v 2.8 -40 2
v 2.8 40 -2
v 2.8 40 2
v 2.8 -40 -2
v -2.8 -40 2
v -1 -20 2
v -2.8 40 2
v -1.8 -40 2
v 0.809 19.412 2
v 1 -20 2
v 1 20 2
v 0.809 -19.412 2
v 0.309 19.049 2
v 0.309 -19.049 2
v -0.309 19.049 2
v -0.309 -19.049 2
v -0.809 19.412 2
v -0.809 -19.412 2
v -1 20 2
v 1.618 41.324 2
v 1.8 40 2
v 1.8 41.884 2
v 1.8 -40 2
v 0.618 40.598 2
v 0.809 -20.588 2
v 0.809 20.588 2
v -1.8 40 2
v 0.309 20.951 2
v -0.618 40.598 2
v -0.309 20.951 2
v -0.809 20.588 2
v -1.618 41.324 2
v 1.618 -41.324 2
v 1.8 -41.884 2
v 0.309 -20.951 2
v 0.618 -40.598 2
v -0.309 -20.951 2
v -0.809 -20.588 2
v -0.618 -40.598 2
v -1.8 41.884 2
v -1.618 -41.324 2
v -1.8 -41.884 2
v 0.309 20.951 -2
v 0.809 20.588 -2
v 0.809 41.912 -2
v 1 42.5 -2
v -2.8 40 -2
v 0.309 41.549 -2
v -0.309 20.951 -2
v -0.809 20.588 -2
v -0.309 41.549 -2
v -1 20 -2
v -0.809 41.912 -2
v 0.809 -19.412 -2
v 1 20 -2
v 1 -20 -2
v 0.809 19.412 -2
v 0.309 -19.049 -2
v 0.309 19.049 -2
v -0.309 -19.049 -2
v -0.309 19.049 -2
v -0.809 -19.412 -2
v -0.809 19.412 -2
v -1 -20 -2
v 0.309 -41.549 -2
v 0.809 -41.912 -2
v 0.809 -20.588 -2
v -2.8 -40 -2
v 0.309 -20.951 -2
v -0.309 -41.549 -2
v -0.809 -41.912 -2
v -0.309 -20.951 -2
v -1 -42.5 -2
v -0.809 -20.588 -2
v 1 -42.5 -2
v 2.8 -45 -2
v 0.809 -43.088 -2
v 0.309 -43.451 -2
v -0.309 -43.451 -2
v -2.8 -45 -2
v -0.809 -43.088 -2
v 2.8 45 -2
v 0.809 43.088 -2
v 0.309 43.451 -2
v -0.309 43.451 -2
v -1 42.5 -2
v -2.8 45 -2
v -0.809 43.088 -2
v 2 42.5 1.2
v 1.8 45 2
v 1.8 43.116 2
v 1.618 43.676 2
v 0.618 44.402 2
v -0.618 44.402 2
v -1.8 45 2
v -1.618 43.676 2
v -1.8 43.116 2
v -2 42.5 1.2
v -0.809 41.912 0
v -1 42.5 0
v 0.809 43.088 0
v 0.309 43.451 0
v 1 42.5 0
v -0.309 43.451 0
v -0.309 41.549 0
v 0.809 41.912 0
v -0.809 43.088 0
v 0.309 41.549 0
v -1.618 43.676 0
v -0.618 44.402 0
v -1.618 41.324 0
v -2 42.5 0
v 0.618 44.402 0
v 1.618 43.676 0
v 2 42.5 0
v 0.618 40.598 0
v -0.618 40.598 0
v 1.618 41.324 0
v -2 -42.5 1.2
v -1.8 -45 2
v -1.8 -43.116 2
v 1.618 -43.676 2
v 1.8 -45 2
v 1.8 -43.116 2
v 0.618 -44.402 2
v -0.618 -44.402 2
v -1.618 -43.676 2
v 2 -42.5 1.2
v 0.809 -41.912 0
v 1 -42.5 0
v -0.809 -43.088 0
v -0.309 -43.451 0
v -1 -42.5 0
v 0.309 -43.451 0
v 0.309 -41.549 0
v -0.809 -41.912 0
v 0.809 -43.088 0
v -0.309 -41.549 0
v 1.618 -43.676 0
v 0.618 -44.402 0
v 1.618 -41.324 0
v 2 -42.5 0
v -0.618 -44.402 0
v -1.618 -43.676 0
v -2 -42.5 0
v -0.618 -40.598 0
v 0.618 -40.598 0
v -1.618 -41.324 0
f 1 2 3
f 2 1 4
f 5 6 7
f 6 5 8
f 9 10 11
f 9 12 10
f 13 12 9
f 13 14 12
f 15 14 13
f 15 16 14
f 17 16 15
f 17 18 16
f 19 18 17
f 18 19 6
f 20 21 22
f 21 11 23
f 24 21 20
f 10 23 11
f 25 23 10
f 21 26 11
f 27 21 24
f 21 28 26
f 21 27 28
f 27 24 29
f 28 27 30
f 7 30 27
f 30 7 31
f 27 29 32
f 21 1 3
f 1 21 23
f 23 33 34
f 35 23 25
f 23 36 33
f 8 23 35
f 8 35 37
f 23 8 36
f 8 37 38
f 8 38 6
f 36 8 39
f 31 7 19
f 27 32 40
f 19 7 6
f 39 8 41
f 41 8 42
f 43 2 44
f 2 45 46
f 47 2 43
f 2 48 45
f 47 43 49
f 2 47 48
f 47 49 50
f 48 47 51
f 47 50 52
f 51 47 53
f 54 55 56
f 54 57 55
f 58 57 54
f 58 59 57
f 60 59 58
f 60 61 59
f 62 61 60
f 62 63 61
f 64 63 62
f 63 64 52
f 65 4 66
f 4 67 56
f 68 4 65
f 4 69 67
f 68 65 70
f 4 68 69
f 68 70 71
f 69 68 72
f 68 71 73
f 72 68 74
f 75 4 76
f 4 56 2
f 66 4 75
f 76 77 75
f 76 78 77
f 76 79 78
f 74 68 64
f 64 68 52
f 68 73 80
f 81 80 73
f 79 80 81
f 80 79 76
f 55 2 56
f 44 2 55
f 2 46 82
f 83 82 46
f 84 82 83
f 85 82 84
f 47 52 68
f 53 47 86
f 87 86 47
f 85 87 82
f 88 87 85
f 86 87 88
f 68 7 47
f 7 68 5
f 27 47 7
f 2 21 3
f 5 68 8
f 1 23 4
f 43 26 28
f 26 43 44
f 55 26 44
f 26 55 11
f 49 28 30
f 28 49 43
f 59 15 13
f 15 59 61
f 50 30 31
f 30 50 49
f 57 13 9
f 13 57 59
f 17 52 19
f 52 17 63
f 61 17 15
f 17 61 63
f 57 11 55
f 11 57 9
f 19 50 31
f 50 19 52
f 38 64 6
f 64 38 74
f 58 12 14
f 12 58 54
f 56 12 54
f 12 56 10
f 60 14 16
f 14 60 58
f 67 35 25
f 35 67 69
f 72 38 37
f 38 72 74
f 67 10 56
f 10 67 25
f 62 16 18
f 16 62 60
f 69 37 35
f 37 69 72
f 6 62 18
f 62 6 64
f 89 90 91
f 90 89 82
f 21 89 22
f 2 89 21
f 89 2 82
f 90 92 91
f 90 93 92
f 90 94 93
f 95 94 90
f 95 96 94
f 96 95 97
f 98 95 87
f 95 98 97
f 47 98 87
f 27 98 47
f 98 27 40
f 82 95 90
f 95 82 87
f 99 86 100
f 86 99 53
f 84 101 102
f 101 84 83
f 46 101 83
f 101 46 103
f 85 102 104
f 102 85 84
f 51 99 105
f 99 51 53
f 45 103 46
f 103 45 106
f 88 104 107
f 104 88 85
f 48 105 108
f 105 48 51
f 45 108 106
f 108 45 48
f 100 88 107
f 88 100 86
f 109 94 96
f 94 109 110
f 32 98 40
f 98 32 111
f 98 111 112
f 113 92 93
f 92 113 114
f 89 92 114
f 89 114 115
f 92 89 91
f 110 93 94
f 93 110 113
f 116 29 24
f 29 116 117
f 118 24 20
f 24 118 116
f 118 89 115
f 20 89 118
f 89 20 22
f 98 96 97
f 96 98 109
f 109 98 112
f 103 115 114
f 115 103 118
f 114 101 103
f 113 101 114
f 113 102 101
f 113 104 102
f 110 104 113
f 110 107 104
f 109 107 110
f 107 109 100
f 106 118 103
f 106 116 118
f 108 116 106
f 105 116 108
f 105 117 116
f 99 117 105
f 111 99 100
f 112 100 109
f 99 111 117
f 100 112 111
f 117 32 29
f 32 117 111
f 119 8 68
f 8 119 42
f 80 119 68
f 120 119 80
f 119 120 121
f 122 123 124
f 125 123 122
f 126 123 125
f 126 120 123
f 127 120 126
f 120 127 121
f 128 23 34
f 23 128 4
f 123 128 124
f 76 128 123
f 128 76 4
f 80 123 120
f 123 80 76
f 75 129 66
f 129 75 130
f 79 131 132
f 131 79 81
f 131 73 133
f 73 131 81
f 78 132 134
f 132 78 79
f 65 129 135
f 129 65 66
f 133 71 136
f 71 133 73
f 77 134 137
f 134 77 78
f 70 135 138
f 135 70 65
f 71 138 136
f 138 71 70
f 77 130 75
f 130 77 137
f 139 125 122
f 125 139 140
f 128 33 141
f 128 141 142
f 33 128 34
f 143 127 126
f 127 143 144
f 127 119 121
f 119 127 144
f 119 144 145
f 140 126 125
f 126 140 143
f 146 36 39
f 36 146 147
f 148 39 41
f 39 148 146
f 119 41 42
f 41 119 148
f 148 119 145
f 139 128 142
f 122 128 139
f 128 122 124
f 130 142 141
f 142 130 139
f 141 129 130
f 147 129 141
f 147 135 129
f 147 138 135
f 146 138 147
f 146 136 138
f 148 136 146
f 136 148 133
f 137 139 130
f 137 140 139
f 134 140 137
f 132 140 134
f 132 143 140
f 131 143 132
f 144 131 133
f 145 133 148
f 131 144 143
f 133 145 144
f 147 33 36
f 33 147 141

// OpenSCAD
// file: TrapezioIsoceles.scad
module TrapezioIsoceles(profundidade,largura,altura,deslocamento) {

//altura = 4;
//profundidade = 5; 
//largura = 6;
//deslocamento = 1; 
//altura=altura+0.2;
deslocamentoZ = -altura/2;
deslocamentoX = -largura/2; 
deslocamentoY = -profundidade/2;

pontosTrapezio = [
  [ deslocamentoX, deslocamentoY,  deslocamentoZ ],  //0
  [ deslocamentoX+largura, deslocamentoY,  deslocamentoZ ],  //1
  [ deslocamentoX+largura, deslocamentoY+profundidade,  deslocamentoZ ],  //2
  [ deslocamentoX+0, deslocamentoY+profundidade, deslocamentoZ ],  //3
  [ deslocamentoX+deslocamento,  deslocamentoY, deslocamentoZ+altura ],  //4
  [ deslocamentoX+largura-deslocamento,  deslocamentoY, deslocamentoZ+altura ],  //5
  [ deslocamentoX+largura-deslocamento,deslocamentoY+profundidade, deslocamentoZ+altura ],  //6
  [ deslocamentoX+deslocamento,  deslocamentoY+profundidade, deslocamentoZ+altura ]]; //7
  
facesTrapezio = [
  [0,1,2,3],  // bottom
  [4,5,1,0],  // front
  [7,6,5,4],  // top
  [5,6,2,1],  // right
  [6,7,3,2],  // back
  [7,4,0,3]]; // left
  
polyhedron( pontosTrapezio, facesTrapezio );


//polygon([[0,0],[5,0],[4,3],[1,3]]);

//cube([17,17,3]);
}
// file: TrapezioFurado.scad
use <TrapezioIsoceles.scad>


module TrapezioFurado(profundidade,largura,altura) {

    //altura = 4; 
    tamCubo = 24; 
    deslocamento = 1;

    //profundidade = 5; 
    //largura = 6; 
    posTrapezio = tamCubo/2 - altura/2;
    hFuros = profundidade;

    difference() {
        TrapezioIsoceles(profundidade,largura,altura,deslocamento); 

        cylinder (altura+0.1, r=1, center = true, $fn=10);
        translate([0,0,altura-2])
        cylinder (altura, r=2, center = true, $fn=10);
    }
}

//TrapezioFurado(5,5,4); 
// file: Haste.scad
use <TrapezioFurado.scad>
use <TrapezioIsoceles.scad>

module Haste(largura,altura,comprimento,suportes) {
 
profundidadeTrapezio = 5; 
larguraTrapezio = largura; 

if (suportes) {
// Suportes laterais 
for (a = [0:180:181]) {
    rotate([0,0,a])
    translate([profundidadeTrapezio/2+altura/2-1,0,0]) {
        difference(){
            cube([altura-1,larguraTrapezio+8,altura],true);
            rotate([90,0,90])
            TrapezioIsoceles(profundidadeTrapezio,largura+1,altura,1);
        }

    }
}
}
// Haste principal furada 
difference() {
    cube([largura,comprimento,altura],true);
    if (suportes) {
    rotate([0,90,0]) 
    cylinder (larguraTrapezio+1, r=1, center = true, $fn=10);
    }
    translate([0,comprimento/4,0])   
    cylinder (larguraTrapezio+1, r=1, center = true, $fn=10);
    translate([0,-comprimento/4,0])   
    cylinder (larguraTrapezio+1, r=1, center = true, $fn=10);
}

// Extremidades da haste 
for (a = [0:180:181]) {
    rotate([0,0,a])
    translate([0,comprimento/2+profundidadeTrapezio/2 ,0])
    TrapezioFurado(profundidadeTrapezio,larguraTrapezio,altura);  
}
}

//Haste(5.6,4,30,false); 
// main file
use <Haste.scad> 



altura = 4; 
largura = 5.6; 
suporte_lateral = false; 

// Gera uma haste com as propriedades descritas nas variáveis 'largura', 'altura' e 'tamanho'. 
// 4 laterais horizontais 
tamanho = 80;
// 4 para partes inferiores e superiores 
//tamanho = 100;
// 4 laterias verticais 
//tamanho = 20;
//suporte_lateral = true; 
Haste(largura,altura,tamanho,suporte_lateral); 
